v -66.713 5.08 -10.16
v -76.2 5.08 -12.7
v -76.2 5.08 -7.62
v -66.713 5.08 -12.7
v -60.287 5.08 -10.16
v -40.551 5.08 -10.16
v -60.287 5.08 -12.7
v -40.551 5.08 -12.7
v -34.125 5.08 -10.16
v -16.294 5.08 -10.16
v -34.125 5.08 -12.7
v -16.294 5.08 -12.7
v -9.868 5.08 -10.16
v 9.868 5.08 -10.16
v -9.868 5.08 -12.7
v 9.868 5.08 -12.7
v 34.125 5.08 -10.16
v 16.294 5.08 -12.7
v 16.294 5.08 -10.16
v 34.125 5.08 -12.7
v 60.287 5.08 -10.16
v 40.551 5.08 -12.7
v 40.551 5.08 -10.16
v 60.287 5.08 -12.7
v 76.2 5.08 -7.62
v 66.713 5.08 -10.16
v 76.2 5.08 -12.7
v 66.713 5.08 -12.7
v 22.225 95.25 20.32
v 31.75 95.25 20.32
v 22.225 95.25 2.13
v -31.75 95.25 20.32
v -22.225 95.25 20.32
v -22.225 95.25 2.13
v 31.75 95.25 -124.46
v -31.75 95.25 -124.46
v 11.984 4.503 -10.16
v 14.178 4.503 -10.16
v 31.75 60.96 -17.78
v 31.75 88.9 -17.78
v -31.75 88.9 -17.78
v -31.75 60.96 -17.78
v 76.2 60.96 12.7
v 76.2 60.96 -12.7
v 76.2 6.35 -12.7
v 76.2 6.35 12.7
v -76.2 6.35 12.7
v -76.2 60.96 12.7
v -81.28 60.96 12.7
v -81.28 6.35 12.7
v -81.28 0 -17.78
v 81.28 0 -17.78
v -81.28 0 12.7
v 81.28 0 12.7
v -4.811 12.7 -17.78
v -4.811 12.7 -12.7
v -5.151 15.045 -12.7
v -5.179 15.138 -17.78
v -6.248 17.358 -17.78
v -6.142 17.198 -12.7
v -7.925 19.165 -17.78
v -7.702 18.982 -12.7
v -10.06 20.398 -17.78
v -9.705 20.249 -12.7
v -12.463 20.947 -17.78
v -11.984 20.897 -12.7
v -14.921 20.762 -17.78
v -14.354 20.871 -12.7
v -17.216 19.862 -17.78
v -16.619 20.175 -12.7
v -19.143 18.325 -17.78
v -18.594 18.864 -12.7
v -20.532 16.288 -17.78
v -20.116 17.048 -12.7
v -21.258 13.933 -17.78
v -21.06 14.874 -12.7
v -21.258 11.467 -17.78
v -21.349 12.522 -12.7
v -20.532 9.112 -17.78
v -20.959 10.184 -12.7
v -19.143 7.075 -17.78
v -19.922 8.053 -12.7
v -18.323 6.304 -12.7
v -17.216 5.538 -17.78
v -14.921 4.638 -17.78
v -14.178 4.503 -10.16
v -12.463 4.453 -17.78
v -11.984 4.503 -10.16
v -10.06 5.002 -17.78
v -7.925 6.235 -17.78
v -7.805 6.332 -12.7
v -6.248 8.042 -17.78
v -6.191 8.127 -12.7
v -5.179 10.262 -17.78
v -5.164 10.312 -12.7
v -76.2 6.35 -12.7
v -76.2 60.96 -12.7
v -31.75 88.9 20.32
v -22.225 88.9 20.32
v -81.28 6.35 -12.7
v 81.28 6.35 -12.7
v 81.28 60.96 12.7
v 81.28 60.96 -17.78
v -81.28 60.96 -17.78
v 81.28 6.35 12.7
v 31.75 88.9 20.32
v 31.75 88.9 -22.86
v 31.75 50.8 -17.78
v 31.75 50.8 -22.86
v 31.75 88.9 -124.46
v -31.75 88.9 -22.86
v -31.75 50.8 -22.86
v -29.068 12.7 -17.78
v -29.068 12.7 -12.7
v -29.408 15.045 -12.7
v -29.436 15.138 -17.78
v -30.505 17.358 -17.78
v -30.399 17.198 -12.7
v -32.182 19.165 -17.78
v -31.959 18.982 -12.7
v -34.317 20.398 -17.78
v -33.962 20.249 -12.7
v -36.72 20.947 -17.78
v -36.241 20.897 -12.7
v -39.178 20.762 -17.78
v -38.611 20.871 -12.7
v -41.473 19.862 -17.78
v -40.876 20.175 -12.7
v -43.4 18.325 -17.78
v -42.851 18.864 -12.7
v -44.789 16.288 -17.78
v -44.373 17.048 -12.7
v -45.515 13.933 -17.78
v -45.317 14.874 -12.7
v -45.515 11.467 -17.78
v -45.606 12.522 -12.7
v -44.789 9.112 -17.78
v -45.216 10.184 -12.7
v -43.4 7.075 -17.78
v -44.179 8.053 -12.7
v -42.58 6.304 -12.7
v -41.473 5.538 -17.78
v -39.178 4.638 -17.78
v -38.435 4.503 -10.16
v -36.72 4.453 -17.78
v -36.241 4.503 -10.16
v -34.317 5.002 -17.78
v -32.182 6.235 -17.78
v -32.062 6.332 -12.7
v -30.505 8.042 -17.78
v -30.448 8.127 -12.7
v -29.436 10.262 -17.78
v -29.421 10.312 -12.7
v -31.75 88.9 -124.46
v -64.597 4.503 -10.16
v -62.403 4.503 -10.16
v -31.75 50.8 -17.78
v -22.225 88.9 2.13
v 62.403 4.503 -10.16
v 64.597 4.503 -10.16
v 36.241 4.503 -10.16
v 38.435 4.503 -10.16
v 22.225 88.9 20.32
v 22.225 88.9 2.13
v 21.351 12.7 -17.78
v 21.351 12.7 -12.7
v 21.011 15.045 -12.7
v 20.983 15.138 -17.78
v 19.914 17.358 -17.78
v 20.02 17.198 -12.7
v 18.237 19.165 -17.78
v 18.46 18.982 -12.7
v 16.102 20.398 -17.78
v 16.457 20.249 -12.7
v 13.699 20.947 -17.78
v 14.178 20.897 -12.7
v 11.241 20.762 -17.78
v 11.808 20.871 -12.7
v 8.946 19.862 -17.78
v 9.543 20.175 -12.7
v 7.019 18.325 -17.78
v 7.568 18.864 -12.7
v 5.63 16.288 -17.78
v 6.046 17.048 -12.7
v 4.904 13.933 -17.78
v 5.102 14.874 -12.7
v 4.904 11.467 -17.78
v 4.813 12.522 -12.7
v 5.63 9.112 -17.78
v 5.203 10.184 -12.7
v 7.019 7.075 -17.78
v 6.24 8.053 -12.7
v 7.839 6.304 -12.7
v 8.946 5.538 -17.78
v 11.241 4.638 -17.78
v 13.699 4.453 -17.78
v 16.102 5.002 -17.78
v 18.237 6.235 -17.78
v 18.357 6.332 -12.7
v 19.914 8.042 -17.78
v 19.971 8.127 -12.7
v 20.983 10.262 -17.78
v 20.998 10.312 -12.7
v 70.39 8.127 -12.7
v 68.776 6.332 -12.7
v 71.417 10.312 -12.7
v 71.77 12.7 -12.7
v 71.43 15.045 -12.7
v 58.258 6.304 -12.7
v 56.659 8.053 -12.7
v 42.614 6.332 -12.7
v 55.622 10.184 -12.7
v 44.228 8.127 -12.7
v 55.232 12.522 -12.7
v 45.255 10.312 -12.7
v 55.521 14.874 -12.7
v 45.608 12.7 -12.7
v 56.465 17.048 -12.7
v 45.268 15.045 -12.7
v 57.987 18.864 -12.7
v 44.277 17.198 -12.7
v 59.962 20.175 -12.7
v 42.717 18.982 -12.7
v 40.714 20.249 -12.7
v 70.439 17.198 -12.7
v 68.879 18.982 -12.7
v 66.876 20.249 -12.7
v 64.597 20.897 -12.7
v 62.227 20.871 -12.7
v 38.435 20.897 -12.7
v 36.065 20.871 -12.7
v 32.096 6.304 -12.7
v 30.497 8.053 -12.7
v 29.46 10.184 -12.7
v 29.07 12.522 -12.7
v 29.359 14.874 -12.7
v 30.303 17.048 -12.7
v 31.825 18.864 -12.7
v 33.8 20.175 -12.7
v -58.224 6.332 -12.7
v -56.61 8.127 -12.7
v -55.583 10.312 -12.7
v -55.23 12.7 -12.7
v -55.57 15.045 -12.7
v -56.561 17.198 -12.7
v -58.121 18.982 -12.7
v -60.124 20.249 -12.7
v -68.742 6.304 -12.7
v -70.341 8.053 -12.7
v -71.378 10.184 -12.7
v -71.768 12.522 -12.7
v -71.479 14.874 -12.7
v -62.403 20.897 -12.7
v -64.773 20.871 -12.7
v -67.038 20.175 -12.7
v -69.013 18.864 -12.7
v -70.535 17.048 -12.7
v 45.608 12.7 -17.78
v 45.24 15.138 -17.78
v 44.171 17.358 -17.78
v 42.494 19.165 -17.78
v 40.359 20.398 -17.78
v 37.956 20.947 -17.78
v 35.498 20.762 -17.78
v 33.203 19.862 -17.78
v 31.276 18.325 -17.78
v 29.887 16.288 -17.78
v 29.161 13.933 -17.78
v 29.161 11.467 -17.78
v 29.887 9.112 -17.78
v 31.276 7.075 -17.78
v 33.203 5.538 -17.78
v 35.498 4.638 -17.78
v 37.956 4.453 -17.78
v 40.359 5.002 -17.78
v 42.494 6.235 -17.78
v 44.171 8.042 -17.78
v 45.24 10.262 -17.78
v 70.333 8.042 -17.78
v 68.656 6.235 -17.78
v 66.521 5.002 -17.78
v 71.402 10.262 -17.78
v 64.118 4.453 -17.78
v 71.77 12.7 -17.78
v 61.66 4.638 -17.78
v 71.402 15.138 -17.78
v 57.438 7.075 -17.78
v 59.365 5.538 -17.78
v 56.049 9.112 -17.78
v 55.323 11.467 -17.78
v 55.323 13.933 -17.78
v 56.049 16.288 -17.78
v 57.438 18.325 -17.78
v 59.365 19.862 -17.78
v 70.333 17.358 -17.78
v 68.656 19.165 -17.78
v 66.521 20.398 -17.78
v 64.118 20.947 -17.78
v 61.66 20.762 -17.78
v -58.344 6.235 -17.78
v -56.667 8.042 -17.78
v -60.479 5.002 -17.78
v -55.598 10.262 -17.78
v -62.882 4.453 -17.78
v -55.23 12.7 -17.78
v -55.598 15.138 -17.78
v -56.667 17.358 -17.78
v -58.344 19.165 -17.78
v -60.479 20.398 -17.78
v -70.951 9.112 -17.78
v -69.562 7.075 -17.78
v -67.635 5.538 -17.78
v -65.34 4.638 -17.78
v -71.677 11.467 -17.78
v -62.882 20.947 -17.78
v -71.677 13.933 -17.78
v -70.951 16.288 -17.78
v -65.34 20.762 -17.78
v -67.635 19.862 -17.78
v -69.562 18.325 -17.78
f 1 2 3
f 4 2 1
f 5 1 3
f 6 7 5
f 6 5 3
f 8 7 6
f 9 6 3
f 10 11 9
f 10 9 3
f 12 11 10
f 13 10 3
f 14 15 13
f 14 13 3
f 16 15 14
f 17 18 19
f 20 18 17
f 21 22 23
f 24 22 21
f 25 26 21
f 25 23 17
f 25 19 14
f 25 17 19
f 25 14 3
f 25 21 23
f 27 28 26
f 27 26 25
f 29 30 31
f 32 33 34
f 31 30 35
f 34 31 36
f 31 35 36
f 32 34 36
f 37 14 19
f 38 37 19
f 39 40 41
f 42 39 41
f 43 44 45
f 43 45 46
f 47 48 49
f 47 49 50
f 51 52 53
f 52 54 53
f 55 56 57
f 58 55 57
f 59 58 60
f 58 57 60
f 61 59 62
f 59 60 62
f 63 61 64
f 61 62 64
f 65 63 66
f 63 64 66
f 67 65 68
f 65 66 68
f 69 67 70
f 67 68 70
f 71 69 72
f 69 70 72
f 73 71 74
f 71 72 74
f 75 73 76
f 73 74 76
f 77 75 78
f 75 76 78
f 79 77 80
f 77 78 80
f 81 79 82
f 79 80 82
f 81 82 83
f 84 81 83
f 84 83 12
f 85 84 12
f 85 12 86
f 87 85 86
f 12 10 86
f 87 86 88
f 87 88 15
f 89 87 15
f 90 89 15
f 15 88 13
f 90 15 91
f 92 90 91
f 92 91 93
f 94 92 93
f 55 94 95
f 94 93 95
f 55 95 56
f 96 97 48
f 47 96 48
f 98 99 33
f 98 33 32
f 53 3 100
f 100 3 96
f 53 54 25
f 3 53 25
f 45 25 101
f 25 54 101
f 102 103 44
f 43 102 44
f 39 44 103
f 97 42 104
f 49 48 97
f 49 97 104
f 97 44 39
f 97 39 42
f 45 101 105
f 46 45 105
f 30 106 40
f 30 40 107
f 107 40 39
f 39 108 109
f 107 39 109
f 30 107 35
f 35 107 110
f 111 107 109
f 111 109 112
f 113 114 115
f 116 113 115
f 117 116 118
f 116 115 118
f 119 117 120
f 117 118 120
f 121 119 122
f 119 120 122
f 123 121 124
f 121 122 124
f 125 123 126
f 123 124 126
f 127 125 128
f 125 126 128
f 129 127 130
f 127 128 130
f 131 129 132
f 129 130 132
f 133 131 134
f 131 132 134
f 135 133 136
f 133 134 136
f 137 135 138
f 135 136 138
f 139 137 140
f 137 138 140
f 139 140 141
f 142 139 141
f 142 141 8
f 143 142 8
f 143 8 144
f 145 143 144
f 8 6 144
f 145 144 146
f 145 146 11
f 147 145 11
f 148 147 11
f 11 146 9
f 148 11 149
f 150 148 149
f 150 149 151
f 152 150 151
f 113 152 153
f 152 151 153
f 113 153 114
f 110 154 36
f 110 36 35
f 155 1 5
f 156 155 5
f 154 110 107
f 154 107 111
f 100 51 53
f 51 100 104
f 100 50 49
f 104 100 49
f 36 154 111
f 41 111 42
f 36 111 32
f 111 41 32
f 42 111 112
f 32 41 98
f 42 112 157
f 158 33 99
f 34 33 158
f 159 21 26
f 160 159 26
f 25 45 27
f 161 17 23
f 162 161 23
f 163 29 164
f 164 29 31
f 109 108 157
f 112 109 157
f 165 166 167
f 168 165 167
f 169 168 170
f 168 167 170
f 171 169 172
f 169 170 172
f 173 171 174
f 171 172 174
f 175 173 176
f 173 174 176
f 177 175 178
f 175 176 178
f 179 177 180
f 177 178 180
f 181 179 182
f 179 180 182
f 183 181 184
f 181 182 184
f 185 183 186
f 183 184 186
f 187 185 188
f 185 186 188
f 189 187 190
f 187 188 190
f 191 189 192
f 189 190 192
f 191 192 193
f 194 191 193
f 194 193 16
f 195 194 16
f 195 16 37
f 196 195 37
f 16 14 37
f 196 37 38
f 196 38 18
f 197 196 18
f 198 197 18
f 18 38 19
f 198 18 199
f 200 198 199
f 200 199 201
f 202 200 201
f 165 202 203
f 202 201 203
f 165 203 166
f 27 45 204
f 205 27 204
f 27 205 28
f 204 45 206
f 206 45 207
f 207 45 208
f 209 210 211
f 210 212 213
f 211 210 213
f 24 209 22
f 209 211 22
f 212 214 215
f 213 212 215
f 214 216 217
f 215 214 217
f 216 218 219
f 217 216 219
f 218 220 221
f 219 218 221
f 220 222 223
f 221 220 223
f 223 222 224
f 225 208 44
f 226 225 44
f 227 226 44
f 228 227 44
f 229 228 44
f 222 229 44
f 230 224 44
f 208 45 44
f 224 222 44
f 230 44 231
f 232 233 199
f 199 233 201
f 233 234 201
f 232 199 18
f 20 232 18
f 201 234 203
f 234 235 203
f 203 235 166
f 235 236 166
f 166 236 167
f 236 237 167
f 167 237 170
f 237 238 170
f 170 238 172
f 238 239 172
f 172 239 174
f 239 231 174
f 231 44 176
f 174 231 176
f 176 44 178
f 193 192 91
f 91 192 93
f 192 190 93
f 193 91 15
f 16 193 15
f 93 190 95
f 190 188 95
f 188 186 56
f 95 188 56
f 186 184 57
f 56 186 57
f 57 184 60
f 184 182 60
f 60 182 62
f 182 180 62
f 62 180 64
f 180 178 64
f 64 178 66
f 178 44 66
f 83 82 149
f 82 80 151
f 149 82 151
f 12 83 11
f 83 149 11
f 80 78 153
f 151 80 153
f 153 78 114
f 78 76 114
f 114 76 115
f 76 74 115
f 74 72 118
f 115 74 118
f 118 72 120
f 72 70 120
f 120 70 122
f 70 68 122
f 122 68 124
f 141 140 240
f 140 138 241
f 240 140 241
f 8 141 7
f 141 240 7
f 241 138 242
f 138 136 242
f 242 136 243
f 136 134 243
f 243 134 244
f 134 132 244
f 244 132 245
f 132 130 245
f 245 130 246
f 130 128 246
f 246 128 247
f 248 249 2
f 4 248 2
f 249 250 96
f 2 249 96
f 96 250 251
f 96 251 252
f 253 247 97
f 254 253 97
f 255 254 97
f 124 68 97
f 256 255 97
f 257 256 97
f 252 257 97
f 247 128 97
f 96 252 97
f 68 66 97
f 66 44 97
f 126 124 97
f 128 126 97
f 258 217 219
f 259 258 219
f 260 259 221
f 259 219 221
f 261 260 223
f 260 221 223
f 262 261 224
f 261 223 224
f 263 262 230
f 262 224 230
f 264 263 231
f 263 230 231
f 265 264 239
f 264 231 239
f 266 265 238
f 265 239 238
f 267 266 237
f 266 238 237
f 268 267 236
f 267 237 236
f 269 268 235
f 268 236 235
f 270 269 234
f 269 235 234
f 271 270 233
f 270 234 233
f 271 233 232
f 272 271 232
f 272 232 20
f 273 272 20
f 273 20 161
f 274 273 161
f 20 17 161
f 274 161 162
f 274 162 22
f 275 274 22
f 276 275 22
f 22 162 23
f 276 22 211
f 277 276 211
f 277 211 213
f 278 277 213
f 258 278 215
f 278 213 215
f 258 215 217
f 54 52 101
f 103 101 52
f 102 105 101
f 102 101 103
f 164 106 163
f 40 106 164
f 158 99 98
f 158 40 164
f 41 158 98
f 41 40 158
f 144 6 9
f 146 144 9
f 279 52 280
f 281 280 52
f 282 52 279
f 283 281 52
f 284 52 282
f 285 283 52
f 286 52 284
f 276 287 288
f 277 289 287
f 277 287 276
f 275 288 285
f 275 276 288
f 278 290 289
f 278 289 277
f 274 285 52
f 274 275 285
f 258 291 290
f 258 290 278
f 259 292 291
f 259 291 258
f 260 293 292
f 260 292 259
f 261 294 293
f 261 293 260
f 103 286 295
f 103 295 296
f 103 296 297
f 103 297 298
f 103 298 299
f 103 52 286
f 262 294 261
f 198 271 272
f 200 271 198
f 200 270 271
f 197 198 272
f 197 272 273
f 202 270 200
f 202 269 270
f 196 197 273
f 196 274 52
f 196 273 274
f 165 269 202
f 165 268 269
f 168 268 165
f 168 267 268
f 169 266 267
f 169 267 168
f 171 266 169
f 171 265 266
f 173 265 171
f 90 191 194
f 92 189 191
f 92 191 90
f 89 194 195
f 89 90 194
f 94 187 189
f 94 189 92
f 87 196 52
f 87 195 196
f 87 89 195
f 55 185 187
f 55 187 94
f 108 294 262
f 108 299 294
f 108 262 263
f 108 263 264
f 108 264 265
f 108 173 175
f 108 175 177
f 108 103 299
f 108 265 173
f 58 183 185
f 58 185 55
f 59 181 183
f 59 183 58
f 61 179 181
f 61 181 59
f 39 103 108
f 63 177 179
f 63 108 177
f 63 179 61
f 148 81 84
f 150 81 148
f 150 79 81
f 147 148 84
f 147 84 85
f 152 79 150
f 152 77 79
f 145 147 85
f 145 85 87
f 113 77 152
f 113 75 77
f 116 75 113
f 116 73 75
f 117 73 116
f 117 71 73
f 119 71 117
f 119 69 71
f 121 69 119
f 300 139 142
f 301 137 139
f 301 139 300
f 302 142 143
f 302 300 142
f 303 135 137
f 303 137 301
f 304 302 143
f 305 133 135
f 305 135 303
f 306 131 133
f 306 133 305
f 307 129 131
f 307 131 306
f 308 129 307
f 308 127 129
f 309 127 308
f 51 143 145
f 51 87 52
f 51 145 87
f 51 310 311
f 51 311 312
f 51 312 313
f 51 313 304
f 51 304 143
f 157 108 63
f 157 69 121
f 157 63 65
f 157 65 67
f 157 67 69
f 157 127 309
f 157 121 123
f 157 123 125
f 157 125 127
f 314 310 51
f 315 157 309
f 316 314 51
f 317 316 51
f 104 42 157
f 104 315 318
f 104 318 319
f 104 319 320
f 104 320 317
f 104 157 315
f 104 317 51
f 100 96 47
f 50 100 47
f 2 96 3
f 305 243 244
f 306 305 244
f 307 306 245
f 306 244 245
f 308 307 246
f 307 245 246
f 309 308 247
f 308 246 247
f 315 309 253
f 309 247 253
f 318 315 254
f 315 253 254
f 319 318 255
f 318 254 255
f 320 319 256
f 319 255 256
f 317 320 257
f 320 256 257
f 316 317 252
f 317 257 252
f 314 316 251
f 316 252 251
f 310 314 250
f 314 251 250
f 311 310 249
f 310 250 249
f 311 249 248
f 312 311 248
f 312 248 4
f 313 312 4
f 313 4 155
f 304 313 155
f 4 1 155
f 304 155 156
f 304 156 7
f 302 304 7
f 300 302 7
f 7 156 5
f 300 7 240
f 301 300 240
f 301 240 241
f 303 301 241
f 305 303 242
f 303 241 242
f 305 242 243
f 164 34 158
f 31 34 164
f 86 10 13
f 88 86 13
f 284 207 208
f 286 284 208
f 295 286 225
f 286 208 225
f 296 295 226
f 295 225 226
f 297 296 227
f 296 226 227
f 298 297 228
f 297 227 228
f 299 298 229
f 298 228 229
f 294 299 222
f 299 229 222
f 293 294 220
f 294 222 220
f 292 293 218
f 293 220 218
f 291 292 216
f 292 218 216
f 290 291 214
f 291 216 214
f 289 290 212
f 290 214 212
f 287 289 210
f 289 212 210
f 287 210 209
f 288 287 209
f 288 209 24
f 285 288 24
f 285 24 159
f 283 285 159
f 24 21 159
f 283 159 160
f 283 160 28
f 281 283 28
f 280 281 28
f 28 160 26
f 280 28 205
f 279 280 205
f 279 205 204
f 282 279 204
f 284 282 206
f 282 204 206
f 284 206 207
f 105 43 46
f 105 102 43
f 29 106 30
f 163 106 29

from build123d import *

# Parameters (mm, degrees)
SKETCH1_W               = 152.4
SKETCH1_H               = 25.4
BOSS_EXTRUDE1_DEPTH     = 5.08
BOSS_EXTRUDE2_DEPTH     = 5.08
SKETCH5_W               = 162.56
SKETCH5_H               = 60.96
BOSS_EXTRUDE3_DEPTH     = 5.08
CUT_EXTRUDE2_DEPTH      = 163.56
SKETCH7_W               = 63.5
SKETCH7_H               = 38.1
BOSS_EXTRUDE4_DEPTH     = 5.08
BOSS_EXTRUDE5_DEPTH     = 6.35
CUT_EXTRUDE3_REACH      = 97.25
SKETCH9_W               = 44.45
SKETCH9_H               = 39.033619981
SKETCH10_R              = 8.2696685
CUT_EXTRUDE4_DEPTH      = 2.54
CUT_EXTRUDE4_DEPTH_BACK = 112.76


with BuildPart() as part:
    # Sketch1 → Boss-Extrude1 (new body)
    with BuildSketch(Plane(origin=(0, 0, 0), x_dir=(1, 0, 0), z_dir=(0, 1, 0))):
        Rectangle(SKETCH1_W, SKETCH1_H)
    extrude(amount=BOSS_EXTRUDE1_DEPTH)

    # Sketch4 → Boss-Extrude2 (add)
    with BuildSketch(Plane(origin=(76.2, 0, 0), x_dir=(0, 0, -1), z_dir=(1, 0, 0))):
        Polygon((-12.7, 0), (-12.7, 5.08), (-12.7, 60.96), (12.7, 60.96), (12.7, 5.08), (12.7, 0), align=None)
    boss_extrude2 = extrude(amount=BOSS_EXTRUDE2_DEPTH)

    # Mirror1: Boss-Extrude2 across plane
    add(boss_extrude2.mirror(Plane(origin=(0, 0, 0), x_dir=(0, 0, 1), z_dir=(1, 0, 0))))

    # Sketch5 → Boss-Extrude3 (add)
    with BuildSketch(Plane(origin=(0, 0, -12.7), x_dir=(-1, 0, 0), z_dir=(0, 0, -1))):
        with Locations((0, 30.48)):
            Rectangle(SKETCH5_W, SKETCH5_H)
    extrude(amount=BOSS_EXTRUDE3_DEPTH)

    # Sketch6 → Cut-Extrude2 (cut, through all)
    with BuildSketch(Plane(origin=(81.28, 0, 0), x_dir=(0, 0, -1), z_dir=(1, 0, 0))):
        Polygon((-12.7, 0), (12.7, 6.35), (-12.7, 6.35), align=None)
    extrude(amount=-CUT_EXTRUDE2_DEPTH, mode=Mode.SUBTRACT)

    # Sketch7 → Boss-Extrude4 (add)
    with BuildSketch(Plane(origin=(0, 0, -17.78), x_dir=(-1, 0, 0), z_dir=(0, 0, -1))):
        with Locations((0, 69.85)):
            Rectangle(SKETCH7_W, SKETCH7_H)
    extrude(amount=BOSS_EXTRUDE4_DEPTH)

    # Sketch8 → Boss-Extrude5 (add)
    with BuildSketch(Plane(origin=(0, 88.9, 0), x_dir=(1, 0, 0), z_dir=(0, 1, 0))):
        Polygon((-31.75, 22.86), (-31.75, 124.46), (31.75, 124.46), (31.75, 22.86), (31.75, 17.78), (31.75, -20.32), (-31.75, -20.32), (-31.75, 17.78), align=None)
    extrude(amount=BOSS_EXTRUDE5_DEPTH)

    # Sketch9 → Cut-Extrude3 (cut, up to next)
    with BuildSketch(Plane(origin=(0, 95.25, 0), x_dir=(1, 0, 0), z_dir=(0, 1, 0)), mode=Mode.PRIVATE) as cut_extrude3_sk1:
        with Locations((0, -21.646832164)):
            Rectangle(SKETCH9_W, SKETCH9_H)
    cut_extrude3_tool1 = extrude(cut_extrude3_sk1.sketch, amount=-CUT_EXTRUDE3_REACH, mode=Mode.PRIVATE) & part.part
    add(cut_extrude3_tool1.solids().sort_by_distance((0, 95.25, 21.646832))[0], mode=Mode.SUBTRACT)

    # Sketch10 → Cut-Extrude4 (cut, two sides)
    with BuildSketch(Plane.XY.offset(-12.7)) as cut_extrude4_sk:
        with Locations((-13.081, 12.7)):
            Circle(SKETCH10_R)
        with Locations((13.081, 12.7)):
            Circle(SKETCH10_R)
        with Locations((37.338, 12.7)):
            Circle(SKETCH10_R)
        with Locations((63.5, 12.7)):
            Circle(SKETCH10_R)
        with Locations((-63.5, 12.7)):
            Circle(SKETCH10_R)
        with Locations((-37.338, 12.7)):
            Circle(SKETCH10_R)
    extrude(amount=CUT_EXTRUDE4_DEPTH, mode=Mode.SUBTRACT)
    extrude(cut_extrude4_sk.sketch, amount=-CUT_EXTRUDE4_DEPTH_BACK, mode=Mode.SUBTRACT)


solid = part.part
